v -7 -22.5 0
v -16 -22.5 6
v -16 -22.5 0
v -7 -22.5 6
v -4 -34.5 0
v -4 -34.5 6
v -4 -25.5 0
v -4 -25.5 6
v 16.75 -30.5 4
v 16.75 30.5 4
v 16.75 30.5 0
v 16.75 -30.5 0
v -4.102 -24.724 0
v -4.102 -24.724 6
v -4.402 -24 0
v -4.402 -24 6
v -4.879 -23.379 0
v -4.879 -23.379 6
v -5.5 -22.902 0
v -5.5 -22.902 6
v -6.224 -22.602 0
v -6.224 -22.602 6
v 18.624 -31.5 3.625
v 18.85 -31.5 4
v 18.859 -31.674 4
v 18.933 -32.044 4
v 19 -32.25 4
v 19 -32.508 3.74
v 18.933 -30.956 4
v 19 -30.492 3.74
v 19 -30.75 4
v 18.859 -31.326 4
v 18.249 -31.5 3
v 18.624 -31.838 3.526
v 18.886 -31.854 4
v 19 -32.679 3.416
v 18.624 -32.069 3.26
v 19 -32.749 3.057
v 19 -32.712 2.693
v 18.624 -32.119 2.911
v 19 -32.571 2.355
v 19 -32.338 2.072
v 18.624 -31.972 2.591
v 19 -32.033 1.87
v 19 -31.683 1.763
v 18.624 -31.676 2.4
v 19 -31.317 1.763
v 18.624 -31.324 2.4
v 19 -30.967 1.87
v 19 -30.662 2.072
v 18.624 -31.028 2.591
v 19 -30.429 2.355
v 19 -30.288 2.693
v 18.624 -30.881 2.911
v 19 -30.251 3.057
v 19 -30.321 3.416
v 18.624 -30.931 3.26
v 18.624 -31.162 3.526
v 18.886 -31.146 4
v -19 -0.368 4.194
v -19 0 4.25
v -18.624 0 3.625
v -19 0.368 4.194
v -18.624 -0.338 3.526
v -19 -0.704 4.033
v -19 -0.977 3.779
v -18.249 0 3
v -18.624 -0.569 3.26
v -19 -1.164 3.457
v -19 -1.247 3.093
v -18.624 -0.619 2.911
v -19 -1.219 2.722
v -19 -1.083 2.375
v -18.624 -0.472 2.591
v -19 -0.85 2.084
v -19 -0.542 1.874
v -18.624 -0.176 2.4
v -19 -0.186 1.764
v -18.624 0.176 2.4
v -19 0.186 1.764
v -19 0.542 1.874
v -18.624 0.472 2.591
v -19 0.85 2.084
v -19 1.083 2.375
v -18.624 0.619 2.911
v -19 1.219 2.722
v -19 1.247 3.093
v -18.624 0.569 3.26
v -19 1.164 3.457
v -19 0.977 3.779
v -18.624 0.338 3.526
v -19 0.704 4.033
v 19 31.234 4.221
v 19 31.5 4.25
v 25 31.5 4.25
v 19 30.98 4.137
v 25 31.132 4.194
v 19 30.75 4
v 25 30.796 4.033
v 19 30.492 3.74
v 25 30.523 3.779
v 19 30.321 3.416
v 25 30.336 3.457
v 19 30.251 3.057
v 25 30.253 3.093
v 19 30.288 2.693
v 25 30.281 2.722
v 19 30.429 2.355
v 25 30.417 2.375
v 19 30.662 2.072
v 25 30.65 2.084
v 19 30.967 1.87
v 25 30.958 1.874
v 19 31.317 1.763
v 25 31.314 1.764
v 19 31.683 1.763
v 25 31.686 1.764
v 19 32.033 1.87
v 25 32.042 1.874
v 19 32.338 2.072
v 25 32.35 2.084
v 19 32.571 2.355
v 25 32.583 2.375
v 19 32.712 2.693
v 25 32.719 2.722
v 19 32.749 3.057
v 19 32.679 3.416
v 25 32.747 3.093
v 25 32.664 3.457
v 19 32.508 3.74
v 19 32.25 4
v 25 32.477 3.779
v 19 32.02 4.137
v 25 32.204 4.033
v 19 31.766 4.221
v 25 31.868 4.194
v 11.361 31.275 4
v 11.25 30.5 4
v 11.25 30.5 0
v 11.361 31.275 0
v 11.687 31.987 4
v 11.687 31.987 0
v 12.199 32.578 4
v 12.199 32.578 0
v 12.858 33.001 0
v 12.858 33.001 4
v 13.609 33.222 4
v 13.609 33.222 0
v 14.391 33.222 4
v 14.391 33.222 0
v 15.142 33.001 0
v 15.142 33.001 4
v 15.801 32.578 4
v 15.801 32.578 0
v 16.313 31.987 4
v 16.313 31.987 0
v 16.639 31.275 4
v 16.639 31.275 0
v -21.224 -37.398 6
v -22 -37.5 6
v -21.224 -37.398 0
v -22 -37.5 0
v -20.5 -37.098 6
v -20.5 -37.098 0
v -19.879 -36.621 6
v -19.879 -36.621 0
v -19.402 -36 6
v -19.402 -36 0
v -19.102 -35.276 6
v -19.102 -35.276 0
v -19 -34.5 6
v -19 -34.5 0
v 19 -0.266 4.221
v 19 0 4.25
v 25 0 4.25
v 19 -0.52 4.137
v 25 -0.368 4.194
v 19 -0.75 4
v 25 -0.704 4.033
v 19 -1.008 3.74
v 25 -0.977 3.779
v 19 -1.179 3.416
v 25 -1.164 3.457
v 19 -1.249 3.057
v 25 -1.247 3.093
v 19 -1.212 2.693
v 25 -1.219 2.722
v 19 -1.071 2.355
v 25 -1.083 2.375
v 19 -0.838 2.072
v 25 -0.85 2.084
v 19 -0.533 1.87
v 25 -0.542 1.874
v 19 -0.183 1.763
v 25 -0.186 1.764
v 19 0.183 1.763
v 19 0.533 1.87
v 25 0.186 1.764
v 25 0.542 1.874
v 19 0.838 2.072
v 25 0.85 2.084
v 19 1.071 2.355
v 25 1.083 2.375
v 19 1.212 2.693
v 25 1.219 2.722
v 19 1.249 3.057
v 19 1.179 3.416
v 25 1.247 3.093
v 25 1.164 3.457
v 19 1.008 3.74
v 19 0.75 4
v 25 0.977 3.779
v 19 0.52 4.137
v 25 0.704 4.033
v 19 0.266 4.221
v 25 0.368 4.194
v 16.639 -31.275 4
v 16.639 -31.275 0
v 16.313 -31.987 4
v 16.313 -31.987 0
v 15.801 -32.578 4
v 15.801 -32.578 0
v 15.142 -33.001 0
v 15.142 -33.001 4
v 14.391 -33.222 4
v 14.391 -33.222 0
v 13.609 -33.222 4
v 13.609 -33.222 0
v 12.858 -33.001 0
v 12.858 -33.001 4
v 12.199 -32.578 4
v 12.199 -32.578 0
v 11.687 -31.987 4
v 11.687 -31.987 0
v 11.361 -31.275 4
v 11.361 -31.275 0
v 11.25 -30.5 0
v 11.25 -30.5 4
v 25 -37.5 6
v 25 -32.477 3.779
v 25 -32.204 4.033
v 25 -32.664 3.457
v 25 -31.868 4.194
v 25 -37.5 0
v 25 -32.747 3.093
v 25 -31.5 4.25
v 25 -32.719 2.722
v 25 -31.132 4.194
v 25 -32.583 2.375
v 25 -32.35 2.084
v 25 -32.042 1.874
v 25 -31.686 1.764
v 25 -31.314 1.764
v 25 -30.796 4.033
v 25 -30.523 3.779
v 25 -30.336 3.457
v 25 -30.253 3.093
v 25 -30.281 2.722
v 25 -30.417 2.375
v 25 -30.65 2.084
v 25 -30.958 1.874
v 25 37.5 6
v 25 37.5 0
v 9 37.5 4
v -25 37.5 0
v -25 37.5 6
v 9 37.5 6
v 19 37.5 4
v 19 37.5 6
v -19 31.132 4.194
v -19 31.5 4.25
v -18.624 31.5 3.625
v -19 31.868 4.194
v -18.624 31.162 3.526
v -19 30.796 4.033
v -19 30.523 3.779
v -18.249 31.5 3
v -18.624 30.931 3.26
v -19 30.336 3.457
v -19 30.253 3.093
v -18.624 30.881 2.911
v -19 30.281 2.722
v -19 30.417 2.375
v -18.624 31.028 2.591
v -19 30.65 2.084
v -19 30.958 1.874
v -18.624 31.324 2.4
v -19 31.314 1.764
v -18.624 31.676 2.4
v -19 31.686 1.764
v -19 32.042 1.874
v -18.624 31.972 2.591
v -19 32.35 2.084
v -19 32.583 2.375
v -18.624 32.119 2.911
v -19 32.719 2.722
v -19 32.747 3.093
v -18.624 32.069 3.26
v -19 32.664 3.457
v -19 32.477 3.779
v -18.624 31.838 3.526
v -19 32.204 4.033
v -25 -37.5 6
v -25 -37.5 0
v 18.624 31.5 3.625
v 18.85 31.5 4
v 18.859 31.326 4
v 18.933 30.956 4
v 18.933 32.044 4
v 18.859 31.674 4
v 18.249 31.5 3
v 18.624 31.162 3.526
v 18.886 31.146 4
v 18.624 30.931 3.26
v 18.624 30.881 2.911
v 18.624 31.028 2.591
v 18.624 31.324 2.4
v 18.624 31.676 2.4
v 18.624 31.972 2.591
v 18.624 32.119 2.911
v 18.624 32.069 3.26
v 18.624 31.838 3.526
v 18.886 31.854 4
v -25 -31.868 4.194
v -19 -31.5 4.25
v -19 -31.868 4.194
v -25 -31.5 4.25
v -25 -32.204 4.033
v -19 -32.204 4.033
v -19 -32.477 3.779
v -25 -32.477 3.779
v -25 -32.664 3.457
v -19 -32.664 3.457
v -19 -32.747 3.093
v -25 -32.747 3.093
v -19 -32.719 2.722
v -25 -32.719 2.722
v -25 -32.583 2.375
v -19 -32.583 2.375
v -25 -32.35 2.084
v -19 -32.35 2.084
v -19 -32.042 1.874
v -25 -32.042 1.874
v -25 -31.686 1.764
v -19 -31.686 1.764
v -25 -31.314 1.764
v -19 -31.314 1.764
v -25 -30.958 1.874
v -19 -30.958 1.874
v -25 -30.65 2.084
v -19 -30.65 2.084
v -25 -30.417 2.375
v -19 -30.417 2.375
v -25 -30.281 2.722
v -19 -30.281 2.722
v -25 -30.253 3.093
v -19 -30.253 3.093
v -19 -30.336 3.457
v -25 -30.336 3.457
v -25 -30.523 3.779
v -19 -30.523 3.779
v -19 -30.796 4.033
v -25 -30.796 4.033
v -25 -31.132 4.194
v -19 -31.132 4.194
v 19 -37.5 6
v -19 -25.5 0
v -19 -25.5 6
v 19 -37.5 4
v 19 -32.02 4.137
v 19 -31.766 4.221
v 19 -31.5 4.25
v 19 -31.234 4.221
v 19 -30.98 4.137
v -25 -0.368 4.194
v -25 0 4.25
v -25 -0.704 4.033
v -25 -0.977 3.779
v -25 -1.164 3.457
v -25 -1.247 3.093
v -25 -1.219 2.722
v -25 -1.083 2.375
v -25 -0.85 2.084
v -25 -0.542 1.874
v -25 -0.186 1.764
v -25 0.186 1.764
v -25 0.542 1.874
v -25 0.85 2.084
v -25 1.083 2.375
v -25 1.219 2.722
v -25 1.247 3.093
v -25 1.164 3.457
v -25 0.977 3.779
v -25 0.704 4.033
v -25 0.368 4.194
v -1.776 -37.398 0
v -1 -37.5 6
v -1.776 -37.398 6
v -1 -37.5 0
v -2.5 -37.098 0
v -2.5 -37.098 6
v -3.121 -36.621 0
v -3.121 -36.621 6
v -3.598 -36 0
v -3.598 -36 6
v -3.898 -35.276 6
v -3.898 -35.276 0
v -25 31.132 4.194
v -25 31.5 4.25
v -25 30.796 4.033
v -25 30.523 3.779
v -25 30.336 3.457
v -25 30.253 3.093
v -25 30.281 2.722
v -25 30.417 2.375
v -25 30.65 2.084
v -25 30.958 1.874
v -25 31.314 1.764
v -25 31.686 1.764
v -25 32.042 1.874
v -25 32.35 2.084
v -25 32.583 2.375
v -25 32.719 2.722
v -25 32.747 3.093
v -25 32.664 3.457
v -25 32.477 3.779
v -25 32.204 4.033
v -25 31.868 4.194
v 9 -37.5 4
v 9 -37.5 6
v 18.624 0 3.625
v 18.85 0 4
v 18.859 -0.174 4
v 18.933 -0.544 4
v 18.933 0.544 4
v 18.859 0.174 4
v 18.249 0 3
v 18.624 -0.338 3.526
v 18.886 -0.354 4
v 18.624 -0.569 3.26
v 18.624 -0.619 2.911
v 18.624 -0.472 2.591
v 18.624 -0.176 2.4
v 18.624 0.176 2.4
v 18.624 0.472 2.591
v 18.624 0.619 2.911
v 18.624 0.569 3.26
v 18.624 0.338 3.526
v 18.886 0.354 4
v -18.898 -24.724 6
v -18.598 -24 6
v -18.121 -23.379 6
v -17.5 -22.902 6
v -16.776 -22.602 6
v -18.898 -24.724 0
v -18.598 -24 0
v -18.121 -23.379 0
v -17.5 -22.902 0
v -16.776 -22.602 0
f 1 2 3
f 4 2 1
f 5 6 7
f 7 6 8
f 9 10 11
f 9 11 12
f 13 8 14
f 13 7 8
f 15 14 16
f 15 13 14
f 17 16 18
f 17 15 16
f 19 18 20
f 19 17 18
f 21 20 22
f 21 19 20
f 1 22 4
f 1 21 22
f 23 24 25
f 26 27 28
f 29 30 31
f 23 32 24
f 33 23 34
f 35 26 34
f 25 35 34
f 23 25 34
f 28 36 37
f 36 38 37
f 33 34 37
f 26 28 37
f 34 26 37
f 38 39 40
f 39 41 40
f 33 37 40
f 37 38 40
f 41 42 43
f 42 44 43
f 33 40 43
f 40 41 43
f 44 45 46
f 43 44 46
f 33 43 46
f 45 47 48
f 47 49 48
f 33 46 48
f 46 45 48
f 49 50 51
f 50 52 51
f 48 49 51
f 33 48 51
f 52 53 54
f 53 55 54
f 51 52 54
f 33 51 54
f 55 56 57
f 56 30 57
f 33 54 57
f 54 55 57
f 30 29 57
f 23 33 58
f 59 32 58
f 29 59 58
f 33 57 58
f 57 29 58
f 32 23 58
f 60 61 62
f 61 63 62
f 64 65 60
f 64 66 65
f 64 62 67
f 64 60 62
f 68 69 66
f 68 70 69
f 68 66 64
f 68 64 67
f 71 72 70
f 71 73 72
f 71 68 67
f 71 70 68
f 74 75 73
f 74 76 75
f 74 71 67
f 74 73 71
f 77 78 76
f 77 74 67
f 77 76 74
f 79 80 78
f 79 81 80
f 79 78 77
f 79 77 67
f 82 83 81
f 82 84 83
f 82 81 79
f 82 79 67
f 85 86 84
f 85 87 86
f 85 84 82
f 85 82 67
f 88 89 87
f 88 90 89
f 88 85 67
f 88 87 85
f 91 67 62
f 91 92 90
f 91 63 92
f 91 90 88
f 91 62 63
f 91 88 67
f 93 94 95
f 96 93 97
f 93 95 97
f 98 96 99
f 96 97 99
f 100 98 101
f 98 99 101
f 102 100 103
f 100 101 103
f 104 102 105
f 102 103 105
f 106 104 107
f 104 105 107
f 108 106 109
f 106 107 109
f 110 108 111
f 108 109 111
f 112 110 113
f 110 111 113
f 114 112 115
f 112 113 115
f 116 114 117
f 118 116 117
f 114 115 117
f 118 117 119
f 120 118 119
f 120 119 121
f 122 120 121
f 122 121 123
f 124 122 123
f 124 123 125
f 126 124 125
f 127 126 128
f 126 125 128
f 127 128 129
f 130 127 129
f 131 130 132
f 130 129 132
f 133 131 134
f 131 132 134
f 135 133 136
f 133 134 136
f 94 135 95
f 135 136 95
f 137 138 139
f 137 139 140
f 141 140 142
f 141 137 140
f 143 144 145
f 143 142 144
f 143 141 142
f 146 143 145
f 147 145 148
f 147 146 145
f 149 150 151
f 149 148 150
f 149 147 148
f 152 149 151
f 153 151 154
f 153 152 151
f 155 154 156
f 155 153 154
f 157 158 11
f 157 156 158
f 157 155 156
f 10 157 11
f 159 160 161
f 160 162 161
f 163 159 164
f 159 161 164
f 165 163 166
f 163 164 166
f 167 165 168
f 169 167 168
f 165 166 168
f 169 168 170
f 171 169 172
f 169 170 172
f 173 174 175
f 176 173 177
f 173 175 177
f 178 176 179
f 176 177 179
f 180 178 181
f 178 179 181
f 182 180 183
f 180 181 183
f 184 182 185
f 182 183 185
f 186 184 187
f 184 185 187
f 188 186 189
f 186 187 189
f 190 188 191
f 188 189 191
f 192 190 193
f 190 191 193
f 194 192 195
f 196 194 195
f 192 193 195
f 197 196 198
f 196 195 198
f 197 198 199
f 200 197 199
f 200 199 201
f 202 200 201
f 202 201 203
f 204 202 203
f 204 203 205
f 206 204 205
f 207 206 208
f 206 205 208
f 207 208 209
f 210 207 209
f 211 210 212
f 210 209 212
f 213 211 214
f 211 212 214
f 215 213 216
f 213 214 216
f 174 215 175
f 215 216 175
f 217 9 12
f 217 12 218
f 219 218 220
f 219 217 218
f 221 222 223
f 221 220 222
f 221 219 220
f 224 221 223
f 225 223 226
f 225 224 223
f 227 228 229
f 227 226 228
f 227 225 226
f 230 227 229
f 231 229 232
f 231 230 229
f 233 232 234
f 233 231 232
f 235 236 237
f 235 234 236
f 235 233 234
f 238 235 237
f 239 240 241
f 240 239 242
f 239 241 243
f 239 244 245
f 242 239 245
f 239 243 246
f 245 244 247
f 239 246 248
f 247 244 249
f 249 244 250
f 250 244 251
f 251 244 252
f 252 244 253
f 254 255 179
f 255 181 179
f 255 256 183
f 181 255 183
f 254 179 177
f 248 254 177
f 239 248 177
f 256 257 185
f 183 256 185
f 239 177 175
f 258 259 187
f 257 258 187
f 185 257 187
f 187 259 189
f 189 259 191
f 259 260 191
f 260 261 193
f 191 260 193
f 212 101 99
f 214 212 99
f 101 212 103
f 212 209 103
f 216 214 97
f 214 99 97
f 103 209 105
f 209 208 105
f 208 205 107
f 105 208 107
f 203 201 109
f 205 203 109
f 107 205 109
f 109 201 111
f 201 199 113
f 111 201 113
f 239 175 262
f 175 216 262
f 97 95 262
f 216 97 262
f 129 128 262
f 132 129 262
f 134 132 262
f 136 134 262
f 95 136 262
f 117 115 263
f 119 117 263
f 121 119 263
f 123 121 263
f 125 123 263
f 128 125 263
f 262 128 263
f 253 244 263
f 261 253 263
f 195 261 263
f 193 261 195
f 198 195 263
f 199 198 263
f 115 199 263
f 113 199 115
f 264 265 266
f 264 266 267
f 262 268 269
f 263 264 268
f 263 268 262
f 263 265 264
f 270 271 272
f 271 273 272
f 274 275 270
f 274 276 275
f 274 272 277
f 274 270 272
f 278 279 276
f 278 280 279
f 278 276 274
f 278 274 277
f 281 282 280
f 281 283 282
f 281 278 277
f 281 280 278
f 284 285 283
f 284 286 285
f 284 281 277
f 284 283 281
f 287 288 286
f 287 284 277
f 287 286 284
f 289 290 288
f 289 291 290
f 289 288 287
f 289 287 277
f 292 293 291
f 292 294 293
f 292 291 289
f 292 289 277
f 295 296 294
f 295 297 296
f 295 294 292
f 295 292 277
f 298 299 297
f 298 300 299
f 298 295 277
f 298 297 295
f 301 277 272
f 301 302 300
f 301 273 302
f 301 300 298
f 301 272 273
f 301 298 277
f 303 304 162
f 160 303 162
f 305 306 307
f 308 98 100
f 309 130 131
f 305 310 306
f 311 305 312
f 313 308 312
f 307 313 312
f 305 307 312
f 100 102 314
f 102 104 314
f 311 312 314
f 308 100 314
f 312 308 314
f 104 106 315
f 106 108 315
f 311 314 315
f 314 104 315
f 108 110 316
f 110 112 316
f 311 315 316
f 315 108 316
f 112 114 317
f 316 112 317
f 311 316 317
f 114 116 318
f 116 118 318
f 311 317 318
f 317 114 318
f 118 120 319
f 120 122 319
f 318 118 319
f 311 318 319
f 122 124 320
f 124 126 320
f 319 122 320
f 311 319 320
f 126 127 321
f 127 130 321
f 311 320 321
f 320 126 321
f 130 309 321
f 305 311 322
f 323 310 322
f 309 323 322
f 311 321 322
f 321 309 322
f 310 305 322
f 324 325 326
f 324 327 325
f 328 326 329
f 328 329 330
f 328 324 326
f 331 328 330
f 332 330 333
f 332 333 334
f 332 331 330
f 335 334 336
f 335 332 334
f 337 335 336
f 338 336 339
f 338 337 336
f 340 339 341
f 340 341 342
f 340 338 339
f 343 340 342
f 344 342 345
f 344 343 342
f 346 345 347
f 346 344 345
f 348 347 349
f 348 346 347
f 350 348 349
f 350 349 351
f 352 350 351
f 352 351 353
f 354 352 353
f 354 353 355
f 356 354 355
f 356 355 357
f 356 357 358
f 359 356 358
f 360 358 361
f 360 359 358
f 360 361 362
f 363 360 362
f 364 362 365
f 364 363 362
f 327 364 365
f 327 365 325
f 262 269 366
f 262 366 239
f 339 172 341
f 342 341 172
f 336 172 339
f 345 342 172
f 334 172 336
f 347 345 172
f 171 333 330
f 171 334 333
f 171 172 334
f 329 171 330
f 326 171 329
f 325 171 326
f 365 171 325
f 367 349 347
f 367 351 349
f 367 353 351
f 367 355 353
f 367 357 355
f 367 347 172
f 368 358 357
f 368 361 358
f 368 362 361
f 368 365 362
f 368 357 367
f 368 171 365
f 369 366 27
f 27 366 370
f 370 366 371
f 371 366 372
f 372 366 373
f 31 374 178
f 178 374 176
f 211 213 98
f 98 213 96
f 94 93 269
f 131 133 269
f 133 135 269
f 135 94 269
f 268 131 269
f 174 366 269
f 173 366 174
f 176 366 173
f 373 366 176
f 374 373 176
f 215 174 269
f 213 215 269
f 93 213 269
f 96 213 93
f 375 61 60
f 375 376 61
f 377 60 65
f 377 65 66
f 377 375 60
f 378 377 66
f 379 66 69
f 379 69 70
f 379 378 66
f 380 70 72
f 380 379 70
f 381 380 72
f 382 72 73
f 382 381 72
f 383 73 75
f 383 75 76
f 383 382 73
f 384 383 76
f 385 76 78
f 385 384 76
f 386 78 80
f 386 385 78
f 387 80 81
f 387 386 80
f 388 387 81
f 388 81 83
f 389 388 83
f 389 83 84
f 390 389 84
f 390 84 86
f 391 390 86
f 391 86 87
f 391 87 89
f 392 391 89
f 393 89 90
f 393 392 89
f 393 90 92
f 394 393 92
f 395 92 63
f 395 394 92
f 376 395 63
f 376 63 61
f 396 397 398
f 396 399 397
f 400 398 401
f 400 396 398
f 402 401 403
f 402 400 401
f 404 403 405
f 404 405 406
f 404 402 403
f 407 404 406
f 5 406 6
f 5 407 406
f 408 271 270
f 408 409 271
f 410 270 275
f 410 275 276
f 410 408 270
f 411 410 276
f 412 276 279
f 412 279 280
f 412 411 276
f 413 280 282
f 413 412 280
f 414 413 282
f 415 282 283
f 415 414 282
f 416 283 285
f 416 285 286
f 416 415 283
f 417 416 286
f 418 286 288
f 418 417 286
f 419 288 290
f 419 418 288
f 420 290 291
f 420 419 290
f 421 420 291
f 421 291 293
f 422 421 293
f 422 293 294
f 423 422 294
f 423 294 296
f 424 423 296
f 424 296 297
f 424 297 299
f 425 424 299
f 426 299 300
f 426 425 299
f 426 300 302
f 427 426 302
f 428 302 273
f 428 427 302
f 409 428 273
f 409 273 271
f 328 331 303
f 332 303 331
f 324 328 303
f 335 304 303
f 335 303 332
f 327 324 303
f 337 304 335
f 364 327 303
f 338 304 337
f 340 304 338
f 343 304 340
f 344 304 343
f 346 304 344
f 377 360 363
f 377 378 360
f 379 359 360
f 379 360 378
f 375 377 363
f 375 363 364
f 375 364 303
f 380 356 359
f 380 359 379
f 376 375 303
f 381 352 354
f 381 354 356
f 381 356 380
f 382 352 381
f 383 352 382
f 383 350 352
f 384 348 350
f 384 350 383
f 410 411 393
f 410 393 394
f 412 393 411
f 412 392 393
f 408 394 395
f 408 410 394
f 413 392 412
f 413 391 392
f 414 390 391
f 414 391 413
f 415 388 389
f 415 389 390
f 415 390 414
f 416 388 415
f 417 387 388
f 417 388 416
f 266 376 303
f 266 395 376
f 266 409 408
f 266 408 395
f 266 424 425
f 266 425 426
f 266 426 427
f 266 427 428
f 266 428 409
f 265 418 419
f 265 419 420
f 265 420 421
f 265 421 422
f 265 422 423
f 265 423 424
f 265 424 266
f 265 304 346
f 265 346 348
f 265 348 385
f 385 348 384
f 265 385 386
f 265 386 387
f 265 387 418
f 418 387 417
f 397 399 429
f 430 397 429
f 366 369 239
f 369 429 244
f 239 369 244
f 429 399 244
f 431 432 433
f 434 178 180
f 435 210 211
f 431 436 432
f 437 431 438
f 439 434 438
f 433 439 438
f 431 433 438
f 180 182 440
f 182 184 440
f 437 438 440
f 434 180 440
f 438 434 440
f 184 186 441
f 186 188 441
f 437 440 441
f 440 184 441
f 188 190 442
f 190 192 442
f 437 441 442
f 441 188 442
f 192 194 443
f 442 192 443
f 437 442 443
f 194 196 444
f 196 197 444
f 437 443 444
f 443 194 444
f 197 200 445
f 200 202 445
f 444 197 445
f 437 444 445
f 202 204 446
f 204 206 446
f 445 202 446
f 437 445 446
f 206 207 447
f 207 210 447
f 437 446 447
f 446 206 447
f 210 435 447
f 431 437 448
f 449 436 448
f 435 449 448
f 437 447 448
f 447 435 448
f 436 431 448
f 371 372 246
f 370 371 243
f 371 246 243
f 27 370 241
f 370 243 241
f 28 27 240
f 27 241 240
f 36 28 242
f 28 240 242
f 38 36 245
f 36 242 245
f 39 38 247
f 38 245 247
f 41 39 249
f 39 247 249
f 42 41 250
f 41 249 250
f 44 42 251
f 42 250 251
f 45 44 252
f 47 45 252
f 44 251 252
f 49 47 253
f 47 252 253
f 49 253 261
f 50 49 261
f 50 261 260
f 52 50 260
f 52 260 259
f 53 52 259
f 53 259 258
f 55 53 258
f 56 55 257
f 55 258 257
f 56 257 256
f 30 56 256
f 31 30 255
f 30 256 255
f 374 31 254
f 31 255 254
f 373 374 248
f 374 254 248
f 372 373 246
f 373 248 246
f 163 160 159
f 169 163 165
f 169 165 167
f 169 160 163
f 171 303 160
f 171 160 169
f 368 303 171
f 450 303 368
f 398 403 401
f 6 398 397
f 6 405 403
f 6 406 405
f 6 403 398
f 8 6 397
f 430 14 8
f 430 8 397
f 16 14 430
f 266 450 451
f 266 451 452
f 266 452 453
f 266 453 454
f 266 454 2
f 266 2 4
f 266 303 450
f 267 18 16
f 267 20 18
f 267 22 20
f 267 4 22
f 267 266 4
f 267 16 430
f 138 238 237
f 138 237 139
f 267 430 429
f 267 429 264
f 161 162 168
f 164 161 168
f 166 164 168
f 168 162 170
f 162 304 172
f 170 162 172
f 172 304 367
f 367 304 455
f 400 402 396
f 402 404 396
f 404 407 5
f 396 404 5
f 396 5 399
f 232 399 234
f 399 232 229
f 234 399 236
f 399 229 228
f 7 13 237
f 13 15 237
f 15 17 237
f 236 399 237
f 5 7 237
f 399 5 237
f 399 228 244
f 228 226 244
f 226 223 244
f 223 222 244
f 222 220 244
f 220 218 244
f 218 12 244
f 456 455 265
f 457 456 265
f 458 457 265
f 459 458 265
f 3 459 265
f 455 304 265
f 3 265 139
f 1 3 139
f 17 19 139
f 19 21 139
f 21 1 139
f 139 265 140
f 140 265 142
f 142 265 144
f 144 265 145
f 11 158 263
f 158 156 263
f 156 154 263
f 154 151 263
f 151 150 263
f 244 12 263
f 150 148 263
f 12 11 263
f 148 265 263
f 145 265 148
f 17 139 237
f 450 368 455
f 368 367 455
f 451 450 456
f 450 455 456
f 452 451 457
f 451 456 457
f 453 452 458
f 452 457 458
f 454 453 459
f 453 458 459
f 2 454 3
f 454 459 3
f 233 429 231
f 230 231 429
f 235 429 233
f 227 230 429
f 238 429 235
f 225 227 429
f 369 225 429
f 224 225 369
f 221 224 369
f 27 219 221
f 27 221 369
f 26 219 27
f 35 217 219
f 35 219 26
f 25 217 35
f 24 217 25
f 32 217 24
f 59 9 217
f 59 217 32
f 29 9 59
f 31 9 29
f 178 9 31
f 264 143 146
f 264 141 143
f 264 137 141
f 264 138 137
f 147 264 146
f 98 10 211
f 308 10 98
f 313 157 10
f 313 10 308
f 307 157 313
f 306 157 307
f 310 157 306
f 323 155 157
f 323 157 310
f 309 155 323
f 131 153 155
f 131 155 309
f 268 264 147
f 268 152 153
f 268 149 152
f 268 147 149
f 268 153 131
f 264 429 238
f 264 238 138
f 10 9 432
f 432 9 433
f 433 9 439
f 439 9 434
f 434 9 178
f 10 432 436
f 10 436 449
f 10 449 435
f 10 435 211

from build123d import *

# Parameters (mm, degrees)
SKETCH_1_W          = 50
SKETCH_1_H          = 75
EXTRUDE_1_DEPTH     = 6
CUT_EXTRUDE_1_DEPTH = 46.467021015
M3X0_51_AT_2_COUNT  = 2
M3X0_51_AT_2_PITCH  = 31.5
M3X0_51_AT_3_COUNT  = 2
M3X0_51_AT_3_PITCH  = 63
SKETCH_6_W          = 10
SKETCH_6_H          = 75
CUT_EXTRUDE_2_DEPTH = 2
SKETCH_7_W          = 15
SKETCH_7_H          = 15
CUT_EXTRUDE_3_DEPTH = 46.467021015
FILLET_1_R          = 3


with BuildPart() as part:
    # Эскиз1 → Бобышка-Вытянуть1 (new body)
    with BuildSketch(Plane.XY):
        Rectangle(SKETCH_1_W, SKETCH_1_H)
    extrude(amount=EXTRUDE_1_DEPTH)

    # Эскиз2 → Вырез-Вытянуть1 (cut, through all)
    with BuildSketch(Plane.XY.offset(6)):
        with BuildLine():
            Line((16.75, 30.5), (16.75, -30.5))
            ThreePointArc((16.75, -30.5), (14, -33.25), (11.25, -30.5))
            Line((11.25, -30.5), (11.25, 30.5))
            ThreePointArc((11.25, 30.5), (14, 33.25), (16.75, 30.5))
        make_face()
    extrude(amount=-CUT_EXTRUDE_1_DEPTH, mode=Mode.SUBTRACT)

    # Эскиз4 → Отверстие обработанное метчиком M3x0.51 (revolve, cut)
    with BuildSketch(Plane(origin=(-25, 31.5, 3), x_dir=(0, 0, 1), z_dir=(0, 1, 0))):
        Polygon((0, 0), (0, 6.751075774), (1.25, 6), (1.25, 0), align=None)
    m3x0_51 = revolve(axis=Axis((-31.35, 31.5, 3), (1, 0, 0)), mode=Mode.SUBTRACT)

    # Отверстие обработанное метчиком M3x0.51 at 2: Отверстие обработанное метчиком M3x0.51 ×2
    with Locations(*[(0, -i * M3X0_51_AT_2_PITCH, 0) for i in range(1, M3X0_51_AT_2_COUNT)]):
        add(m3x0_51, mode=Mode.SUBTRACT)

    # Отверстие обработанное метчиком M3x0.51 at 3: Отверстие обработанное метчиком M3x0.51 ×2
    with Locations(*[(0, -i * M3X0_51_AT_3_PITCH, 0) for i in range(1, M3X0_51_AT_3_COUNT)]):
        add(m3x0_51, mode=Mode.SUBTRACT)

    # Зеркальное отражение1: Отверстие обработанное метчиком M3x0.51 across plane
    add(m3x0_51.mirror(Plane.ZY), mode=Mode.SUBTRACT)

    # Зеркальное отражение1 copy 1 sketch → Зеркальное отражение1 copy 1 (revolve, cut)
    with BuildSketch(Plane(origin=(25, 0, 3), x_dir=(0, 0, 1), z_dir=(0, 1, 0))):
        Polygon((0, 0), (0, -6.751075774), (1.25, -6), (1.25, 0), align=None)
    revolve(axis=Axis((31.35, 0, 3), (1, 0, 0)), mode=Mode.SUBTRACT)

    # Зеркальное отражение1 copy 2 sketch → Зеркальное отражение1 copy 2 (revolve, cut)
    with BuildSketch(Plane(origin=(25, -31.5, 3), x_dir=(0, 0, 1), z_dir=(0, 1, 0))):
        Polygon((0, 0), (0, -6.751075774), (1.25, -6), (1.25, 0), align=None)
    revolve(axis=Axis((31.35, -31.5, 3), (1, 0, 0)), mode=Mode.SUBTRACT)

    # Эскиз6 → Вырез-Вытянуть2 (cut)
    with BuildSketch(Plane.XY.offset(6)):
        with Locations((14, 0)):
            Rectangle(SKETCH_6_W, SKETCH_6_H)
    extrude(amount=-CUT_EXTRUDE_2_DEPTH, mode=Mode.SUBTRACT)

    # Эскиз7 → Вырез-Вытянуть3 (cut, through all)
    with BuildSketch(Plane.XY.offset(6)):
        with Locations((-11.5, -30)):
            Rectangle(SKETCH_7_W, SKETCH_7_H)
    extrude(amount=-CUT_EXTRUDE_3_DEPTH, mode=Mode.SUBTRACT)

    # Скругление1
    fillet_1_edges = [part.edges().sort_by_distance(p)[0] for p in [
        (-19, -37.5, 3),
        (-4, -22.5, 3),
        (-4, -37.5, 3),
        (-19, -22.5, 3),
    ]]
    fillet(fillet_1_edges, radius=FILLET_1_R)


solid = part.part
